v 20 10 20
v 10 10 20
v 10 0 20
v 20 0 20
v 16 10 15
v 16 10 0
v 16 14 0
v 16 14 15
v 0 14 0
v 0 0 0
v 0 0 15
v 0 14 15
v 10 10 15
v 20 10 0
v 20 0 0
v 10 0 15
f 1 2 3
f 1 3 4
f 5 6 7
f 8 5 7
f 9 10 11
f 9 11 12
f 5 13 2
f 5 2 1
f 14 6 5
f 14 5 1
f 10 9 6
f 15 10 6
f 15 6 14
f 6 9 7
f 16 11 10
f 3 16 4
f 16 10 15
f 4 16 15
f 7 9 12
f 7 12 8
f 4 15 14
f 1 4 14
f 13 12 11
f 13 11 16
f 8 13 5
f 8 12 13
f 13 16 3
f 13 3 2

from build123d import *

# Parameters (mm, degrees)
BOX_W        = 16
BOX_H        = 14
BOX_DEPTH    = 15
BOX001_W     = 10
BOX001_H     = 10
BOX001_DEPTH = 20


with BuildPart() as cub:
    # Box → Box (new body)
    with BuildSketch(Plane.XY):
        with Locations((8, 7)):
            Rectangle(BOX_W, BOX_H)
    extrude(amount=BOX_DEPTH)


with BuildPart() as fusion:
    # Box001 → Box001 (new body)
    with BuildSketch(Plane(origin=(10, 0, 0), x_dir=(1, 0, 0), z_dir=(0, 0, 1))):
        with Locations((5, 5)):
            Rectangle(BOX001_W, BOX001_H)
    extrude(amount=BOX001_DEPTH)

    # Fusion: union Cub
    add(cub.part)


solid = fusion.part
